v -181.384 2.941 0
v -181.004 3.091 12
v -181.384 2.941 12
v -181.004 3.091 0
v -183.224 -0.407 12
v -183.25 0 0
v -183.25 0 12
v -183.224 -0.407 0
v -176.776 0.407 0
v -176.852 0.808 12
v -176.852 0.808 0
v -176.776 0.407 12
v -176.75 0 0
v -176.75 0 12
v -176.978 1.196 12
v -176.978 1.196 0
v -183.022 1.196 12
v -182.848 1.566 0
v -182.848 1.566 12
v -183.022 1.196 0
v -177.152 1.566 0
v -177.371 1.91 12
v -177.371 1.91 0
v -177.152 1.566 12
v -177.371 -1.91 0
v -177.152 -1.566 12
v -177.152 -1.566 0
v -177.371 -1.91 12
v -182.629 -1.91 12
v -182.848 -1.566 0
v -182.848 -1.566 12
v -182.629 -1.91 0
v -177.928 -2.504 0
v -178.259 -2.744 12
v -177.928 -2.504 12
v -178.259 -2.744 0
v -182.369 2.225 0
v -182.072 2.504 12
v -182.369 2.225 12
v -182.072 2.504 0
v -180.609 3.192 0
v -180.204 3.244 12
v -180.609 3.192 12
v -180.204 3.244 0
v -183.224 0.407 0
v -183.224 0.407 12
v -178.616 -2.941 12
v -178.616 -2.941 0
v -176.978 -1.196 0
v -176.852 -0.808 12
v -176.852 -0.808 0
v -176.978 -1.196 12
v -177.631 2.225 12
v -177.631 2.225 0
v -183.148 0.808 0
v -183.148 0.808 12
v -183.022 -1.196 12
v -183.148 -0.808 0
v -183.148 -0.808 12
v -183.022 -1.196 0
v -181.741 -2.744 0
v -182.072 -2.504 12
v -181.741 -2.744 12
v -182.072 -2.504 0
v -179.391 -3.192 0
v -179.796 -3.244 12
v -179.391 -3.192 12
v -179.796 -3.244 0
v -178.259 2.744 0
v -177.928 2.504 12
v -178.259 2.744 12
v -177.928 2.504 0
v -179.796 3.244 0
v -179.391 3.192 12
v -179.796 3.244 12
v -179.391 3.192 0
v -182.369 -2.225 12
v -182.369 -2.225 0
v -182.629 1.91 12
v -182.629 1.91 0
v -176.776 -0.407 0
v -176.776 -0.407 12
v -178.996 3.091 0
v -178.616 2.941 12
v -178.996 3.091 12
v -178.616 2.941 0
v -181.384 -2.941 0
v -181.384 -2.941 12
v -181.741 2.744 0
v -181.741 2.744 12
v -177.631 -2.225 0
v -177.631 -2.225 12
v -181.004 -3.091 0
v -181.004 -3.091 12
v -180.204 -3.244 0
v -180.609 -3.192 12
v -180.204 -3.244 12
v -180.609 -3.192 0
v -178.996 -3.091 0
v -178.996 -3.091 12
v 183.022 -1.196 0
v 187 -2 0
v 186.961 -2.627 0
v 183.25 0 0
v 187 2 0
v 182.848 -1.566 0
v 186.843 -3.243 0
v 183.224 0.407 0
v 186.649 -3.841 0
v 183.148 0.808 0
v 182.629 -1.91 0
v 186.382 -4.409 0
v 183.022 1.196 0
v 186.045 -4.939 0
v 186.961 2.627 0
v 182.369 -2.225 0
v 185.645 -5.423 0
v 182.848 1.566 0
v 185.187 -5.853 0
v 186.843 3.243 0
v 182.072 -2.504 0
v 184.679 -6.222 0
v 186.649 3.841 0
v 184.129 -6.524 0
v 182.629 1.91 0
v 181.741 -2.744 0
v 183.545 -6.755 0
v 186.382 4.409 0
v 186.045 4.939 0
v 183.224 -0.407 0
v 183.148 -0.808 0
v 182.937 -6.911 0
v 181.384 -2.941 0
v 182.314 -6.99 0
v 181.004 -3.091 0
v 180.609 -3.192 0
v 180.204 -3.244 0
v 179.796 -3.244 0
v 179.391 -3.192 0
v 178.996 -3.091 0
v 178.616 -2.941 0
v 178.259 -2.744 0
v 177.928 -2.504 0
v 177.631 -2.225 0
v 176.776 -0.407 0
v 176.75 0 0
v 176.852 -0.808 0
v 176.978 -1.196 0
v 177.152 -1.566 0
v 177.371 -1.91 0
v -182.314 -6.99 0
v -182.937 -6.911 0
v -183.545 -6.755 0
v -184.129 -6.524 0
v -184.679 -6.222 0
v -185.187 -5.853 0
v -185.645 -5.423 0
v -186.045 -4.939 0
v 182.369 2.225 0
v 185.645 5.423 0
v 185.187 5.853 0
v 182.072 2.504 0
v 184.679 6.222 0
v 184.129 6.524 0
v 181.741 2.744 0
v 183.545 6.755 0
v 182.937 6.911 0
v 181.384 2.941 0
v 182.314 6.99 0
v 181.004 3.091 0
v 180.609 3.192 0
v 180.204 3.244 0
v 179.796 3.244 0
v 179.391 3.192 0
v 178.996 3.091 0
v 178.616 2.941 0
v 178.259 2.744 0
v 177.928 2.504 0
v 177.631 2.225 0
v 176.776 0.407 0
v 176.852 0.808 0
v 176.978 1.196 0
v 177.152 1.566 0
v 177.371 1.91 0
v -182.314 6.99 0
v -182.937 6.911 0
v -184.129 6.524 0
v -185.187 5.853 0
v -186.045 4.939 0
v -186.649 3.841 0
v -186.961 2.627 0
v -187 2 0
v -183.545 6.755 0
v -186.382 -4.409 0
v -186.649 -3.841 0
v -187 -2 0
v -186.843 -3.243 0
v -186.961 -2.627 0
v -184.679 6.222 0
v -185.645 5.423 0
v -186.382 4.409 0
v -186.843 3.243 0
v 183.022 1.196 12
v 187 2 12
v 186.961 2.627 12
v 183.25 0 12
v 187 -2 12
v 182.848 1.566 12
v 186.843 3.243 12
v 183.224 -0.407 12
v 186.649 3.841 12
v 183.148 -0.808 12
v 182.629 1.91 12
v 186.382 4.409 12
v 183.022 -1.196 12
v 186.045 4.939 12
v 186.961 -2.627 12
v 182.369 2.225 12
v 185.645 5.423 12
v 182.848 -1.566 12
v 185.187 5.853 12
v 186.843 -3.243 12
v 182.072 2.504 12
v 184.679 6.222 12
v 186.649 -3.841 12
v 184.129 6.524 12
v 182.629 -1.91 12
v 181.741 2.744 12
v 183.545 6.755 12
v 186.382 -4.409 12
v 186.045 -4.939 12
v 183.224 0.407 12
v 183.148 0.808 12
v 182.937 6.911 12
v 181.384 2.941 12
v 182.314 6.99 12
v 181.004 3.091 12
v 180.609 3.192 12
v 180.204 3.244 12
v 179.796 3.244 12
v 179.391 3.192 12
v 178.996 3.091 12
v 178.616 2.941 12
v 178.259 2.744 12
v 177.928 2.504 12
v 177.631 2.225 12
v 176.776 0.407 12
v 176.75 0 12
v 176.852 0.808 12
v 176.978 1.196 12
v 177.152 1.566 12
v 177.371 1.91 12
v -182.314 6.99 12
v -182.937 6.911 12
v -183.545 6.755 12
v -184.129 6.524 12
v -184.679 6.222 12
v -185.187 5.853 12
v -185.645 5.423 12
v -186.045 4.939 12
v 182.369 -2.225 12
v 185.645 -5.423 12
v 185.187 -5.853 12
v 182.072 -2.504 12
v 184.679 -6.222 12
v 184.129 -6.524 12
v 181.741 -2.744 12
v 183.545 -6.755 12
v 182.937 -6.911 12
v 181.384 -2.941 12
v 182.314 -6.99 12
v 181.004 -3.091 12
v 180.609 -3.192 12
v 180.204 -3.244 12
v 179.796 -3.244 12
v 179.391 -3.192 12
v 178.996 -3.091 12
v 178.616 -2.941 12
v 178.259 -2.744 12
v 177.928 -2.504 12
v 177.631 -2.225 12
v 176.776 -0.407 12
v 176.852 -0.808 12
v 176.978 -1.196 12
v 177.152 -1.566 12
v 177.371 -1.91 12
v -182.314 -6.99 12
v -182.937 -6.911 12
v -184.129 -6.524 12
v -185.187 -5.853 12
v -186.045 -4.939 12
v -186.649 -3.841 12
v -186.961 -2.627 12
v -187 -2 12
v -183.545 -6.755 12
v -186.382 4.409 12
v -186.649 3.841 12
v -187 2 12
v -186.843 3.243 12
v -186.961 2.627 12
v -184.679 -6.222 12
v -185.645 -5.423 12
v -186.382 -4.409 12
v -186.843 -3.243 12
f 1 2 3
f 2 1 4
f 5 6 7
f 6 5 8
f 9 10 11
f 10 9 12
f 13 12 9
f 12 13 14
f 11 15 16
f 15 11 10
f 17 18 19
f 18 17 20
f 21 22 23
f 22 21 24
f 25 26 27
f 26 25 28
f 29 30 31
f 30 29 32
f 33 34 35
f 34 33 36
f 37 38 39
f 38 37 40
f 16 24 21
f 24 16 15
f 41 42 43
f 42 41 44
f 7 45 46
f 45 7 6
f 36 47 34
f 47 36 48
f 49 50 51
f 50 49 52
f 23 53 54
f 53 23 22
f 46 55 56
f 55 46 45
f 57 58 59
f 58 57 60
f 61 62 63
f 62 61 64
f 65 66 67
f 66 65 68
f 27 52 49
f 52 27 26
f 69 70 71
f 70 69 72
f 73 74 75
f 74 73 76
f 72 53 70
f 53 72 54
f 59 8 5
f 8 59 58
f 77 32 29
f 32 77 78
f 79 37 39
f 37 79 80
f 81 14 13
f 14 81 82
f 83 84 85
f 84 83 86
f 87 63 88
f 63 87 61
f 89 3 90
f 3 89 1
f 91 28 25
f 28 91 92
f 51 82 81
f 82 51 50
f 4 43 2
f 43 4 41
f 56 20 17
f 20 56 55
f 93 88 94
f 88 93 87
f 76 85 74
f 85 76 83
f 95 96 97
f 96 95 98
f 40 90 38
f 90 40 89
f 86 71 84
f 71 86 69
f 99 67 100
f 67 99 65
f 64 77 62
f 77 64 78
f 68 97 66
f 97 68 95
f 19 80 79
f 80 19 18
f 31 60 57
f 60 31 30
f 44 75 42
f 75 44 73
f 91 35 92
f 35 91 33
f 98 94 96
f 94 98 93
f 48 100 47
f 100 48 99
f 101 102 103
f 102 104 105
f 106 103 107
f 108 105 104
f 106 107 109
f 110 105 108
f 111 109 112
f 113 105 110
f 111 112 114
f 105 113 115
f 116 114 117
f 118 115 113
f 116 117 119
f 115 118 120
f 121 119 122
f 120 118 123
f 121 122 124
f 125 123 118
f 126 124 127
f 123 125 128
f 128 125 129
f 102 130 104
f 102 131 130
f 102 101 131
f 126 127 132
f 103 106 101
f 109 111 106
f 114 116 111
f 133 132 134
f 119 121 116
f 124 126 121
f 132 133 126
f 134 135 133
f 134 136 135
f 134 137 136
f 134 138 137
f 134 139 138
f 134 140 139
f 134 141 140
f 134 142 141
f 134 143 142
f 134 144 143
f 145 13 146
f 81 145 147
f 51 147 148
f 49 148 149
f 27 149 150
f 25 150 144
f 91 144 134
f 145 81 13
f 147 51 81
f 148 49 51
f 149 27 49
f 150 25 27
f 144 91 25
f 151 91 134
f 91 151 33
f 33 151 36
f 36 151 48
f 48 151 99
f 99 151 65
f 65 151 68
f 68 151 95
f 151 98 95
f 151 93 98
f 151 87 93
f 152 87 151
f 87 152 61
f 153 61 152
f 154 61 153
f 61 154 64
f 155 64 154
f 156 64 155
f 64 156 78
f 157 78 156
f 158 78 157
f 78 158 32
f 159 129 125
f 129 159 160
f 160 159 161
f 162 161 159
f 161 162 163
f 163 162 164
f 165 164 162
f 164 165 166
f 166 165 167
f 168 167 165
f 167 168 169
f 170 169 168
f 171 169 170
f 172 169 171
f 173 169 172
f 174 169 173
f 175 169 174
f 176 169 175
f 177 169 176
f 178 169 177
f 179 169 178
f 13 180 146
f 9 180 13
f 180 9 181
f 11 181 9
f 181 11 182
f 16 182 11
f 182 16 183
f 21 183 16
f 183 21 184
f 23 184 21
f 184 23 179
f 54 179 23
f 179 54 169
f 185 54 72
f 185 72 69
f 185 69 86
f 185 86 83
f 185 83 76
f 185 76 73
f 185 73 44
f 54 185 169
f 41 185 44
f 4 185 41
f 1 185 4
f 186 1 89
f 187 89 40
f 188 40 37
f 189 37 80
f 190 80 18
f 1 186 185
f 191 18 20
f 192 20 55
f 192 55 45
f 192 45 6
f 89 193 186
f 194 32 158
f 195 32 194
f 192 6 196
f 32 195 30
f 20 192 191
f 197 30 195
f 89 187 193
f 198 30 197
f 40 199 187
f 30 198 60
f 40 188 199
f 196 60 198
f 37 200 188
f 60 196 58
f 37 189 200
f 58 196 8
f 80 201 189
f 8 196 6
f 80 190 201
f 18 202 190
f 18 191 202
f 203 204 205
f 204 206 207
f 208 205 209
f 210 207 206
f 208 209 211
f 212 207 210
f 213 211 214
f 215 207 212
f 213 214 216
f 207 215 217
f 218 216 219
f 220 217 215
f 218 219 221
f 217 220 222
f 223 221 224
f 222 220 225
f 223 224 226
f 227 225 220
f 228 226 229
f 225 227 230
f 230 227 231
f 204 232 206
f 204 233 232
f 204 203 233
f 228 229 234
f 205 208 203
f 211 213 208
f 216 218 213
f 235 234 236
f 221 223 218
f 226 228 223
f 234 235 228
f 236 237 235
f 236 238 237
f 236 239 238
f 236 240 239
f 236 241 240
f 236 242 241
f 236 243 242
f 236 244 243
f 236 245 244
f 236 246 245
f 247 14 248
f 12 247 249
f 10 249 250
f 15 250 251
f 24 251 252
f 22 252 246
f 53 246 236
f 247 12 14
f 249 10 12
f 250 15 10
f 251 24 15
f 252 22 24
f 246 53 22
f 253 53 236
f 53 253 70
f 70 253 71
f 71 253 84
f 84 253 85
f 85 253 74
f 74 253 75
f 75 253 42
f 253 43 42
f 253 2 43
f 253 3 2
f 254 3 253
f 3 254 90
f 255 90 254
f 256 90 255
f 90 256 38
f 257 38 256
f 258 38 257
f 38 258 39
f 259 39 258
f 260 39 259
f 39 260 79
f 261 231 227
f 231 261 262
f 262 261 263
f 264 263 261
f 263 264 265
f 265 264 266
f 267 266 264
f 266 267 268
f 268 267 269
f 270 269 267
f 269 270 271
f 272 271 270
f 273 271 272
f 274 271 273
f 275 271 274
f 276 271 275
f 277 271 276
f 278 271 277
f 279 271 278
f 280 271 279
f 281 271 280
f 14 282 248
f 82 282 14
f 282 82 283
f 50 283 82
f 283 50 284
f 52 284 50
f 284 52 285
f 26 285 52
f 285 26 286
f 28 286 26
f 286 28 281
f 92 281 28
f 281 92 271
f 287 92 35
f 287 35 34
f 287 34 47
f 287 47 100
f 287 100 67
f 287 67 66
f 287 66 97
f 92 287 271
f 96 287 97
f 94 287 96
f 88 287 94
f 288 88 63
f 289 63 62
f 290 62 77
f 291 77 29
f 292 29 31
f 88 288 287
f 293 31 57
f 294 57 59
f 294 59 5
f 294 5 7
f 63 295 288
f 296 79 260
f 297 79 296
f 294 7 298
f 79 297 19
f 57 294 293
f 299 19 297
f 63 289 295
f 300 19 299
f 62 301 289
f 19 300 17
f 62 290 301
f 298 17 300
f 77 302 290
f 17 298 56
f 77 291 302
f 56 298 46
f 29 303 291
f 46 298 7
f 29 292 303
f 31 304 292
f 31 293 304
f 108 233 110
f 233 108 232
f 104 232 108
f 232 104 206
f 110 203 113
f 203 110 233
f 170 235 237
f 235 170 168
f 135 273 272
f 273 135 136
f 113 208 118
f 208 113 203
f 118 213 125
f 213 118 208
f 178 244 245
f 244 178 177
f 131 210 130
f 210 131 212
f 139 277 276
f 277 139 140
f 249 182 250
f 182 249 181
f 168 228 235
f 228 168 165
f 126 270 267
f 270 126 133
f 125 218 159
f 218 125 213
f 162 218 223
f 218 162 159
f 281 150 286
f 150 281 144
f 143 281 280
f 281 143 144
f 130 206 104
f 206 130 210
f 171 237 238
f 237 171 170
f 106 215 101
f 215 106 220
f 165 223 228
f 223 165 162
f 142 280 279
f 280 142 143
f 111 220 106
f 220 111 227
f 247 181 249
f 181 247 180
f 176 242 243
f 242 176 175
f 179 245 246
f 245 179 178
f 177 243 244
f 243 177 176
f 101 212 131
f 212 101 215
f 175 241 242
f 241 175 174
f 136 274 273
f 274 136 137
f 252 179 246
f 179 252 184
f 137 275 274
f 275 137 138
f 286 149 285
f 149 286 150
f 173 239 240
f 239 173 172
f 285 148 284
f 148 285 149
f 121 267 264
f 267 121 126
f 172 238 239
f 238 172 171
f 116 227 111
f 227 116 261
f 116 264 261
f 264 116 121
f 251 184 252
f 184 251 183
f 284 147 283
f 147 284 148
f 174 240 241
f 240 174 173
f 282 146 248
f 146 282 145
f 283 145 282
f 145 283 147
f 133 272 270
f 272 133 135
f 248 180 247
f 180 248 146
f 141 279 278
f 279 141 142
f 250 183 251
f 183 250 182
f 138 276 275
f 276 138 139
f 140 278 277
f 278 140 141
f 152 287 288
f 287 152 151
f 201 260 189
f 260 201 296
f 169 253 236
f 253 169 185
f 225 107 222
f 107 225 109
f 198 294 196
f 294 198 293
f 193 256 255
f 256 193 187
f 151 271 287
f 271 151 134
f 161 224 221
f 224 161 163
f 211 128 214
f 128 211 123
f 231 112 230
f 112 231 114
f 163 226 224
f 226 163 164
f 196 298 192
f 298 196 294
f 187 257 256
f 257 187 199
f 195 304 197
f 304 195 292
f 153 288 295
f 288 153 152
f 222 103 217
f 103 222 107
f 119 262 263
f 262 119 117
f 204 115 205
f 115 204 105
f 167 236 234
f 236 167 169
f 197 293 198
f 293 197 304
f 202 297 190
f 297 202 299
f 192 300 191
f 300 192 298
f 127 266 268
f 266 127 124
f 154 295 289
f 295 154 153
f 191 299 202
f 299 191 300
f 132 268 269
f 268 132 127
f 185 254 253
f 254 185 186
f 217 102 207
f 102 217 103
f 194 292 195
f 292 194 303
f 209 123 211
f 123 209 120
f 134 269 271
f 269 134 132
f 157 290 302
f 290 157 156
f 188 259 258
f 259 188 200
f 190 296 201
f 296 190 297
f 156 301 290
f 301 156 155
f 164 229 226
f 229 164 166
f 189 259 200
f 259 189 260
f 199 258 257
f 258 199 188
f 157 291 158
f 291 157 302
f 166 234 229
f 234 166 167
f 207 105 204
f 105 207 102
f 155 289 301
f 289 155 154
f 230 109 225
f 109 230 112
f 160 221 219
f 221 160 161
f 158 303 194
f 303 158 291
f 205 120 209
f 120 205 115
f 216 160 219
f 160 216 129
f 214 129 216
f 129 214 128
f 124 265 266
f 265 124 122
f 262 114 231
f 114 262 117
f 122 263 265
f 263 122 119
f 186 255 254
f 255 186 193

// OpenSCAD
$fn = 50;


difference() {
	union() {
		hull() {
			translate(v = [-182.0000000000, 2.0000000000, 0]) {
				cylinder(h = 12, r = 5);
			}
			translate(v = [182.0000000000, 2.0000000000, 0]) {
				cylinder(h = 12, r = 5);
			}
			translate(v = [-182.0000000000, -2.0000000000, 0]) {
				cylinder(h = 12, r = 5);
			}
			translate(v = [182.0000000000, -2.0000000000, 0]) {
				cylinder(h = 12, r = 5);
			}
		}
	}
	union() {
		translate(v = [-180.0000000000, 0.0000000000, 0]) {
			cylinder(h = 12, r = 3.2500000000);
		}
		translate(v = [180.0000000000, 0.0000000000, 0]) {
			cylinder(h = 12, r = 3.2500000000);
		}
		translate(v = [-180.0000000000, 0.0000000000, 0]) {
			cylinder(h = 12, r = 1.8000000000);
		}
		translate(v = [180.0000000000, 0.0000000000, 0]) {
			cylinder(h = 12, r = 1.8000000000);
		}
		translate(v = [-180.0000000000, 0.0000000000, 0]) {
			cylinder(h = 12, r = 1.8000000000);
		}
		translate(v = [180.0000000000, 0.0000000000, 0]) {
			cylinder(h = 12, r = 1.8000000000);
		}
		translate(v = [-180.0000000000, 0.0000000000, 0]) {
			cylinder(h = 12, r = 1.8000000000);
		}
		translate(v = [180.0000000000, 0.0000000000, 0]) {
			cylinder(h = 12, r = 1.8000000000);
		}
	}
}
